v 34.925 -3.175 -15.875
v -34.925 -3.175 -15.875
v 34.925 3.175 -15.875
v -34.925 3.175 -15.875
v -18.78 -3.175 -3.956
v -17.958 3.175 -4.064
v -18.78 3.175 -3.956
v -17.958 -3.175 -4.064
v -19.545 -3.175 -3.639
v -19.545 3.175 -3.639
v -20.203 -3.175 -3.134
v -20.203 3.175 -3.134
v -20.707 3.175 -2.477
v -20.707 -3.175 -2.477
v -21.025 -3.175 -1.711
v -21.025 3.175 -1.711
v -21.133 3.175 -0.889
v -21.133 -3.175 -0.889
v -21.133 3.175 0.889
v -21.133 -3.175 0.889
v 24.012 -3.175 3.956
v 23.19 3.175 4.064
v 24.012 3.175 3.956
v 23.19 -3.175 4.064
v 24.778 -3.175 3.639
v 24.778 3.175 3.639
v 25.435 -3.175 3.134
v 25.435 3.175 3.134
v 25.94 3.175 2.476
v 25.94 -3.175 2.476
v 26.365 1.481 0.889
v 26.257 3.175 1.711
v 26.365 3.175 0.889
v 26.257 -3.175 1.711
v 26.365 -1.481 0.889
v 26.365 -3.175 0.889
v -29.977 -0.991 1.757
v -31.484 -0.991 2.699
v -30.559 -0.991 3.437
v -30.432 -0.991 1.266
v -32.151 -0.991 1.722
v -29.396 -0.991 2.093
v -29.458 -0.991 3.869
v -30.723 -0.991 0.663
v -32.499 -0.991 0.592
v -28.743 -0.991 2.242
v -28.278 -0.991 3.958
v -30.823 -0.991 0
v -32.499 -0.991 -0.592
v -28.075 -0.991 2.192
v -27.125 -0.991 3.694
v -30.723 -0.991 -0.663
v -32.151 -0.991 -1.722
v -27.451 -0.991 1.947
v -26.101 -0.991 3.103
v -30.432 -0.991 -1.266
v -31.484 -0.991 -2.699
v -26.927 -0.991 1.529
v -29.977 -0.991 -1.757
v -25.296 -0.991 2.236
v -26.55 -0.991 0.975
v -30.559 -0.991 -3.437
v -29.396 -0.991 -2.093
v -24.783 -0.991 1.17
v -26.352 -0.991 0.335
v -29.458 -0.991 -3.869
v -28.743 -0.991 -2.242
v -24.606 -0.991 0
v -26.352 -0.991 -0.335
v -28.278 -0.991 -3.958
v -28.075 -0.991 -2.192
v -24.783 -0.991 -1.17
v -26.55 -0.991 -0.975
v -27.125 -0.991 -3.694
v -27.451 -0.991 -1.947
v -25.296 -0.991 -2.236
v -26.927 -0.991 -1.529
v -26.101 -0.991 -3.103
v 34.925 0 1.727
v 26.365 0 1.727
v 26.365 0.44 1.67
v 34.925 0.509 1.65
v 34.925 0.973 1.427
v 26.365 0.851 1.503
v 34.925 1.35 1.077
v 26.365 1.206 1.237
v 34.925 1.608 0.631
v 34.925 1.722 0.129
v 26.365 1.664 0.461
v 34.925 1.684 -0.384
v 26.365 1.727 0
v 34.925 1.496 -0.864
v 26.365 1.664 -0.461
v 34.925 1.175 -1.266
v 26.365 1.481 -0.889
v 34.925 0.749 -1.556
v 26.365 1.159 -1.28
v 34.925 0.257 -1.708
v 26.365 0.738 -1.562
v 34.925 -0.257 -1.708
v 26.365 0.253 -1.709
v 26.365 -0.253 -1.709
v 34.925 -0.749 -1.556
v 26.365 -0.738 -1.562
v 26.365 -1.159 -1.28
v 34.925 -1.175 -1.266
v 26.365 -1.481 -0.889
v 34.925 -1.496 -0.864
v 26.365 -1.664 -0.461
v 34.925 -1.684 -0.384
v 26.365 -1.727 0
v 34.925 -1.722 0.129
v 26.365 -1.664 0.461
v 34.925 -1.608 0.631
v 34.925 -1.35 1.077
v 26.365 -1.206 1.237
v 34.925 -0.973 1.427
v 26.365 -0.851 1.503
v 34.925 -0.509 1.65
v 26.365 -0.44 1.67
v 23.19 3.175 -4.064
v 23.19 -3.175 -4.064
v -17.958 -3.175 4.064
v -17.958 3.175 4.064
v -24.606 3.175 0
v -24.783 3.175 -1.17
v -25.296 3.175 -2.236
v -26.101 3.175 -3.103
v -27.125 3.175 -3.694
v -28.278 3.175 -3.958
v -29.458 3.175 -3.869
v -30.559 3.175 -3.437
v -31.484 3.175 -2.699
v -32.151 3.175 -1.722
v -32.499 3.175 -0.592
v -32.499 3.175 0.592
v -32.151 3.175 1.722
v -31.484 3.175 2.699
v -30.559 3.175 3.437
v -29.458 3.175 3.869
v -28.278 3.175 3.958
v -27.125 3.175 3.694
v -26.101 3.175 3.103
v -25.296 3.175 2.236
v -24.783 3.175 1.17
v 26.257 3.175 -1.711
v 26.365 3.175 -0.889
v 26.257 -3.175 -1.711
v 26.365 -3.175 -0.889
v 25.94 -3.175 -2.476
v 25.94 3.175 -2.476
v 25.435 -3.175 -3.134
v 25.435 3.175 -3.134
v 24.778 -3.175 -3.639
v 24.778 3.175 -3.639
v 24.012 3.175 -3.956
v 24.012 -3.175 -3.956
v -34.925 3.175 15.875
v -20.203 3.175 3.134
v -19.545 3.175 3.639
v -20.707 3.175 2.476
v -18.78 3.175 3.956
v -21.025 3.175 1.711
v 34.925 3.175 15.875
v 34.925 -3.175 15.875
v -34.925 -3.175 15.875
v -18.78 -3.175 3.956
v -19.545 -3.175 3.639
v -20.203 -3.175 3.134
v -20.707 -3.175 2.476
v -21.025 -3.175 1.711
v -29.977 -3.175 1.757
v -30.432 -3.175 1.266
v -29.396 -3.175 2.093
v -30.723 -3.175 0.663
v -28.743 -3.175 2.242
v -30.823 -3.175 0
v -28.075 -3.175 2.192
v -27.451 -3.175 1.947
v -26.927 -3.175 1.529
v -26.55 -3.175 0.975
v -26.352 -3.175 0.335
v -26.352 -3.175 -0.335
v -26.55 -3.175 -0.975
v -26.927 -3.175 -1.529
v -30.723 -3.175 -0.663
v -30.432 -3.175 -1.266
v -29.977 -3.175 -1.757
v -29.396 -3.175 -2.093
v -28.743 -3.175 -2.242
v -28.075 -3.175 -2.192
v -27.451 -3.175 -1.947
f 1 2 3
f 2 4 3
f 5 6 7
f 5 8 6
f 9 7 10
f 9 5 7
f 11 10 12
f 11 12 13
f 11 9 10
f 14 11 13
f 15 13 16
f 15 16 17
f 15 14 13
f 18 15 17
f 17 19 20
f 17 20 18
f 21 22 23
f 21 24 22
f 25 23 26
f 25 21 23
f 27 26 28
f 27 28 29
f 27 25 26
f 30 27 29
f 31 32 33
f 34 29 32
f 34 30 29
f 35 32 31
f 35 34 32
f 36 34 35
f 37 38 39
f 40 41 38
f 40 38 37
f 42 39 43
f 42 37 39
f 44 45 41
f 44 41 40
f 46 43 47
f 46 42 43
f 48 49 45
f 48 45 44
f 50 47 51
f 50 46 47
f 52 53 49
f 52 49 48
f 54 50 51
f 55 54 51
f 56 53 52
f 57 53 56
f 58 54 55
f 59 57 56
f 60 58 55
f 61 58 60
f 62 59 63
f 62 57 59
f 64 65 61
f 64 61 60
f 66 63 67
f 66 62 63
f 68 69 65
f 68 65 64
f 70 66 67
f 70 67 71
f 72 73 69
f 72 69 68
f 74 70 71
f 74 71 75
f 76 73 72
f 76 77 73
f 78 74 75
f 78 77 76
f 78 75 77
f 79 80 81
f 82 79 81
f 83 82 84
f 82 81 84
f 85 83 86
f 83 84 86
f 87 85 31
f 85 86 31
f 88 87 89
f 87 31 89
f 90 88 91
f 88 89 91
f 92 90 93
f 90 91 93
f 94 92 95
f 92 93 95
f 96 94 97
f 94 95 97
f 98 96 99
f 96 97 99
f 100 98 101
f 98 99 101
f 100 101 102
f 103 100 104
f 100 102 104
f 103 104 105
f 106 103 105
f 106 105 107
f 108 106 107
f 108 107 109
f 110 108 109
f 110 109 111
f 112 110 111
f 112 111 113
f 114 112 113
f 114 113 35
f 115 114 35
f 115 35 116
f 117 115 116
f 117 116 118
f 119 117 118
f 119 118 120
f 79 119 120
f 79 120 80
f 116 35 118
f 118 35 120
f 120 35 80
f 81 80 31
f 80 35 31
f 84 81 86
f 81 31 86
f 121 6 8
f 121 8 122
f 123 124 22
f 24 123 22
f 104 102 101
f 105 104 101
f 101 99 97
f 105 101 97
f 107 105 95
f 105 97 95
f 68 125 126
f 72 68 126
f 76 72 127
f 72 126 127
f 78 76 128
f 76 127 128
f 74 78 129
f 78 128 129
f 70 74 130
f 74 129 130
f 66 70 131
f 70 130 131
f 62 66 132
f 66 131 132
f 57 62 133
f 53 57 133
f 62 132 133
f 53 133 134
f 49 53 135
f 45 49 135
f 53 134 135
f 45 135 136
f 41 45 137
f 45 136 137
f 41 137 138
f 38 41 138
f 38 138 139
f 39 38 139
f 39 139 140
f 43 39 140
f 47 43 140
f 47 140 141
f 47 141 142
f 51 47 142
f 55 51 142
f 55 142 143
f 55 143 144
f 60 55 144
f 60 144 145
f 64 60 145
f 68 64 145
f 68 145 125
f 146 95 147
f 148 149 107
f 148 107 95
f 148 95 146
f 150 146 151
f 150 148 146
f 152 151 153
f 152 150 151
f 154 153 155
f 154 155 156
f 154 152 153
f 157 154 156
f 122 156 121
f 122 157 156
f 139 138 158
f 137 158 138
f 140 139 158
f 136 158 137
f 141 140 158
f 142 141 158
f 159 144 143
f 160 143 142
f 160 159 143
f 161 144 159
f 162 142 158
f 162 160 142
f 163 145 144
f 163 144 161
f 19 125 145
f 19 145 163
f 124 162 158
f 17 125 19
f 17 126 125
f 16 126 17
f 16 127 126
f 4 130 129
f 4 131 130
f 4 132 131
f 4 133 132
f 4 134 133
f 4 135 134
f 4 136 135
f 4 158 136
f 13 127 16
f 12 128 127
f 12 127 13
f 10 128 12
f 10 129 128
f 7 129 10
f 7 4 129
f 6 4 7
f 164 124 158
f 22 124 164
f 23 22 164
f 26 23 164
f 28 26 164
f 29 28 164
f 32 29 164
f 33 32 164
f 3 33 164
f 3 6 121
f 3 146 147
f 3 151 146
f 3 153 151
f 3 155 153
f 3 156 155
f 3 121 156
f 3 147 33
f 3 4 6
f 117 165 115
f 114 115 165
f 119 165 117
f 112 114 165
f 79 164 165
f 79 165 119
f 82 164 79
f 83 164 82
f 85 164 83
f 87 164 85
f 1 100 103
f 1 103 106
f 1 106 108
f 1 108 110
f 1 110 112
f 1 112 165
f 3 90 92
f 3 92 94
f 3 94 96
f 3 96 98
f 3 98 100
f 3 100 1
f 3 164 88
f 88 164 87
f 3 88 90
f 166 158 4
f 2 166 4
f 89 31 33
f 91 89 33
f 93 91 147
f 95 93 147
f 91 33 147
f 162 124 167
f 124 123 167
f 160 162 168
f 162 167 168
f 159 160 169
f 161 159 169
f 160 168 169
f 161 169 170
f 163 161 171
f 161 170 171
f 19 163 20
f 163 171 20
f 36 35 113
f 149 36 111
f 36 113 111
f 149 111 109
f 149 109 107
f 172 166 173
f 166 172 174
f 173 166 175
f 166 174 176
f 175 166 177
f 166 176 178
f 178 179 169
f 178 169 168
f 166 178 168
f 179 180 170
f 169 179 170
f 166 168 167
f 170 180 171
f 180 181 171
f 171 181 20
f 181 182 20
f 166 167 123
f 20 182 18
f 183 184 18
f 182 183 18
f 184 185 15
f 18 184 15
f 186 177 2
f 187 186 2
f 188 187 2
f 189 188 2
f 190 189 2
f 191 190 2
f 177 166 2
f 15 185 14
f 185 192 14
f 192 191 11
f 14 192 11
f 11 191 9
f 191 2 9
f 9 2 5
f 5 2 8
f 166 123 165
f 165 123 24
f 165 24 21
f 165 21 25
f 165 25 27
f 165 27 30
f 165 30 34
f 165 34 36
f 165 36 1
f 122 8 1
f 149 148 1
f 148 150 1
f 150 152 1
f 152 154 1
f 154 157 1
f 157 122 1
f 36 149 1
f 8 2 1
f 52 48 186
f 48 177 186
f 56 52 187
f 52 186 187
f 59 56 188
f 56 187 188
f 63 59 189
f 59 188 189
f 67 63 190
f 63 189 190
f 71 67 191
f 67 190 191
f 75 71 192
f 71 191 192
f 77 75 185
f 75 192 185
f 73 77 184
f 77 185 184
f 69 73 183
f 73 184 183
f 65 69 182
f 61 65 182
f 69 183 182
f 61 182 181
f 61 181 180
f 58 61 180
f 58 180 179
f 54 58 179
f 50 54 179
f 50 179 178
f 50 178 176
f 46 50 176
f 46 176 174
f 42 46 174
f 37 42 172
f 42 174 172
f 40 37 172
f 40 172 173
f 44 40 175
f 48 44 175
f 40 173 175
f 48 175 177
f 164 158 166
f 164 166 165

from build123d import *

# Parameters (mm, degrees)
SKETCH1_W                                      = 69.85
SKETCH1_H                                      = 31.75
BOSS_EXTRUDE1_DEPTH                            = 3.175
SKETCH2_W                                      = 47.498
SKETCH2_H                                      = 8.128
CUT_EXTRUDE1_DEPTH                             = 6.35
FILLET1_R                                      = 3.175
CBORE_FOR_8_SOCKET_HEAD_CAP_SCREW1_D           = 4.4958
CBORE_FOR_8_SOCKET_HEAD_CAP_SCREW1_DEPTH       = 16.51
CBORE_FOR_8_SOCKET_HEAD_CAP_SCREW1_CBORE_D     = 7.9375
CBORE_FOR_8_SOCKET_HEAD_CAP_SCREW1_CBORE_DEPTH = 4.1656
CBORE_FOR_8_SOCKET_HEAD_CAP_SCREW1_TIP         = 1.350674586
F_8_32_TAPPED_HOLE1_D                          = 3.4544
F_8_32_TAPPED_HOLE1_DEPTH                      = 8.5598


with BuildPart() as part:
    # Sketch1 → Boss-Extrude1 (new, symmetric)
    with BuildSketch(Plane(origin=(0, 0, 0), x_dir=(1, 0, 0), z_dir=(0, 1, 0))):
        Rectangle(SKETCH1_W, SKETCH1_H)
    extrude(amount=BOSS_EXTRUDE1_DEPTH, both=True)

    # Sketch2 → Cut-Extrude1 (cut)
    with BuildSketch(Plane(origin=(0, 3.175, 0), x_dir=(1, 0, 0), z_dir=(0, 1, 0))):
        with Locations((2.6162, 0)):
            Rectangle(SKETCH2_W, SKETCH2_H)
    extrude(amount=-CUT_EXTRUDE1_DEPTH, mode=Mode.SUBTRACT)

    # Fillet1
    fillet1_edges = [part.edges().sort_by_distance(p)[0] for p in [
        (-21.1328, 0, 4.064),
        (-21.1328, 0, -4.064),
        (26.3652, 0, -4.064),
        (26.3652, 0, 4.064),
    ]]
    fillet(fillet1_edges, radius=FILLET1_R)

    # CBORE for #8 Socket Head Cap Screw1
    with Locations(Plane(origin=(0, 3.175, 0), x_dir=(1, 0, 0), z_dir=(0, 1, 0))):
        with Locations((-28.575, 0)):
            CounterBoreHole(CBORE_FOR_8_SOCKET_HEAD_CAP_SCREW1_D / 2, CBORE_FOR_8_SOCKET_HEAD_CAP_SCREW1_CBORE_D / 2, CBORE_FOR_8_SOCKET_HEAD_CAP_SCREW1_CBORE_DEPTH, depth=CBORE_FOR_8_SOCKET_HEAD_CAP_SCREW1_DEPTH)
            with Locations((0, 0, -(CBORE_FOR_8_SOCKET_HEAD_CAP_SCREW1_DEPTH + CBORE_FOR_8_SOCKET_HEAD_CAP_SCREW1_TIP / 2))):  # 118° drill point
                Cone(0, CBORE_FOR_8_SOCKET_HEAD_CAP_SCREW1_D / 2, CBORE_FOR_8_SOCKET_HEAD_CAP_SCREW1_TIP, mode=Mode.SUBTRACT)

    # #8-32 Tapped Hole1
    with Locations(Plane(origin=(34.925, 0, 0), x_dir=(0, 0, -1), z_dir=(1, 0, 0))):
        with Locations((0, 0)):
            Hole(F_8_32_TAPPED_HOLE1_D / 2, depth=F_8_32_TAPPED_HOLE1_DEPTH)


solid = part.part
